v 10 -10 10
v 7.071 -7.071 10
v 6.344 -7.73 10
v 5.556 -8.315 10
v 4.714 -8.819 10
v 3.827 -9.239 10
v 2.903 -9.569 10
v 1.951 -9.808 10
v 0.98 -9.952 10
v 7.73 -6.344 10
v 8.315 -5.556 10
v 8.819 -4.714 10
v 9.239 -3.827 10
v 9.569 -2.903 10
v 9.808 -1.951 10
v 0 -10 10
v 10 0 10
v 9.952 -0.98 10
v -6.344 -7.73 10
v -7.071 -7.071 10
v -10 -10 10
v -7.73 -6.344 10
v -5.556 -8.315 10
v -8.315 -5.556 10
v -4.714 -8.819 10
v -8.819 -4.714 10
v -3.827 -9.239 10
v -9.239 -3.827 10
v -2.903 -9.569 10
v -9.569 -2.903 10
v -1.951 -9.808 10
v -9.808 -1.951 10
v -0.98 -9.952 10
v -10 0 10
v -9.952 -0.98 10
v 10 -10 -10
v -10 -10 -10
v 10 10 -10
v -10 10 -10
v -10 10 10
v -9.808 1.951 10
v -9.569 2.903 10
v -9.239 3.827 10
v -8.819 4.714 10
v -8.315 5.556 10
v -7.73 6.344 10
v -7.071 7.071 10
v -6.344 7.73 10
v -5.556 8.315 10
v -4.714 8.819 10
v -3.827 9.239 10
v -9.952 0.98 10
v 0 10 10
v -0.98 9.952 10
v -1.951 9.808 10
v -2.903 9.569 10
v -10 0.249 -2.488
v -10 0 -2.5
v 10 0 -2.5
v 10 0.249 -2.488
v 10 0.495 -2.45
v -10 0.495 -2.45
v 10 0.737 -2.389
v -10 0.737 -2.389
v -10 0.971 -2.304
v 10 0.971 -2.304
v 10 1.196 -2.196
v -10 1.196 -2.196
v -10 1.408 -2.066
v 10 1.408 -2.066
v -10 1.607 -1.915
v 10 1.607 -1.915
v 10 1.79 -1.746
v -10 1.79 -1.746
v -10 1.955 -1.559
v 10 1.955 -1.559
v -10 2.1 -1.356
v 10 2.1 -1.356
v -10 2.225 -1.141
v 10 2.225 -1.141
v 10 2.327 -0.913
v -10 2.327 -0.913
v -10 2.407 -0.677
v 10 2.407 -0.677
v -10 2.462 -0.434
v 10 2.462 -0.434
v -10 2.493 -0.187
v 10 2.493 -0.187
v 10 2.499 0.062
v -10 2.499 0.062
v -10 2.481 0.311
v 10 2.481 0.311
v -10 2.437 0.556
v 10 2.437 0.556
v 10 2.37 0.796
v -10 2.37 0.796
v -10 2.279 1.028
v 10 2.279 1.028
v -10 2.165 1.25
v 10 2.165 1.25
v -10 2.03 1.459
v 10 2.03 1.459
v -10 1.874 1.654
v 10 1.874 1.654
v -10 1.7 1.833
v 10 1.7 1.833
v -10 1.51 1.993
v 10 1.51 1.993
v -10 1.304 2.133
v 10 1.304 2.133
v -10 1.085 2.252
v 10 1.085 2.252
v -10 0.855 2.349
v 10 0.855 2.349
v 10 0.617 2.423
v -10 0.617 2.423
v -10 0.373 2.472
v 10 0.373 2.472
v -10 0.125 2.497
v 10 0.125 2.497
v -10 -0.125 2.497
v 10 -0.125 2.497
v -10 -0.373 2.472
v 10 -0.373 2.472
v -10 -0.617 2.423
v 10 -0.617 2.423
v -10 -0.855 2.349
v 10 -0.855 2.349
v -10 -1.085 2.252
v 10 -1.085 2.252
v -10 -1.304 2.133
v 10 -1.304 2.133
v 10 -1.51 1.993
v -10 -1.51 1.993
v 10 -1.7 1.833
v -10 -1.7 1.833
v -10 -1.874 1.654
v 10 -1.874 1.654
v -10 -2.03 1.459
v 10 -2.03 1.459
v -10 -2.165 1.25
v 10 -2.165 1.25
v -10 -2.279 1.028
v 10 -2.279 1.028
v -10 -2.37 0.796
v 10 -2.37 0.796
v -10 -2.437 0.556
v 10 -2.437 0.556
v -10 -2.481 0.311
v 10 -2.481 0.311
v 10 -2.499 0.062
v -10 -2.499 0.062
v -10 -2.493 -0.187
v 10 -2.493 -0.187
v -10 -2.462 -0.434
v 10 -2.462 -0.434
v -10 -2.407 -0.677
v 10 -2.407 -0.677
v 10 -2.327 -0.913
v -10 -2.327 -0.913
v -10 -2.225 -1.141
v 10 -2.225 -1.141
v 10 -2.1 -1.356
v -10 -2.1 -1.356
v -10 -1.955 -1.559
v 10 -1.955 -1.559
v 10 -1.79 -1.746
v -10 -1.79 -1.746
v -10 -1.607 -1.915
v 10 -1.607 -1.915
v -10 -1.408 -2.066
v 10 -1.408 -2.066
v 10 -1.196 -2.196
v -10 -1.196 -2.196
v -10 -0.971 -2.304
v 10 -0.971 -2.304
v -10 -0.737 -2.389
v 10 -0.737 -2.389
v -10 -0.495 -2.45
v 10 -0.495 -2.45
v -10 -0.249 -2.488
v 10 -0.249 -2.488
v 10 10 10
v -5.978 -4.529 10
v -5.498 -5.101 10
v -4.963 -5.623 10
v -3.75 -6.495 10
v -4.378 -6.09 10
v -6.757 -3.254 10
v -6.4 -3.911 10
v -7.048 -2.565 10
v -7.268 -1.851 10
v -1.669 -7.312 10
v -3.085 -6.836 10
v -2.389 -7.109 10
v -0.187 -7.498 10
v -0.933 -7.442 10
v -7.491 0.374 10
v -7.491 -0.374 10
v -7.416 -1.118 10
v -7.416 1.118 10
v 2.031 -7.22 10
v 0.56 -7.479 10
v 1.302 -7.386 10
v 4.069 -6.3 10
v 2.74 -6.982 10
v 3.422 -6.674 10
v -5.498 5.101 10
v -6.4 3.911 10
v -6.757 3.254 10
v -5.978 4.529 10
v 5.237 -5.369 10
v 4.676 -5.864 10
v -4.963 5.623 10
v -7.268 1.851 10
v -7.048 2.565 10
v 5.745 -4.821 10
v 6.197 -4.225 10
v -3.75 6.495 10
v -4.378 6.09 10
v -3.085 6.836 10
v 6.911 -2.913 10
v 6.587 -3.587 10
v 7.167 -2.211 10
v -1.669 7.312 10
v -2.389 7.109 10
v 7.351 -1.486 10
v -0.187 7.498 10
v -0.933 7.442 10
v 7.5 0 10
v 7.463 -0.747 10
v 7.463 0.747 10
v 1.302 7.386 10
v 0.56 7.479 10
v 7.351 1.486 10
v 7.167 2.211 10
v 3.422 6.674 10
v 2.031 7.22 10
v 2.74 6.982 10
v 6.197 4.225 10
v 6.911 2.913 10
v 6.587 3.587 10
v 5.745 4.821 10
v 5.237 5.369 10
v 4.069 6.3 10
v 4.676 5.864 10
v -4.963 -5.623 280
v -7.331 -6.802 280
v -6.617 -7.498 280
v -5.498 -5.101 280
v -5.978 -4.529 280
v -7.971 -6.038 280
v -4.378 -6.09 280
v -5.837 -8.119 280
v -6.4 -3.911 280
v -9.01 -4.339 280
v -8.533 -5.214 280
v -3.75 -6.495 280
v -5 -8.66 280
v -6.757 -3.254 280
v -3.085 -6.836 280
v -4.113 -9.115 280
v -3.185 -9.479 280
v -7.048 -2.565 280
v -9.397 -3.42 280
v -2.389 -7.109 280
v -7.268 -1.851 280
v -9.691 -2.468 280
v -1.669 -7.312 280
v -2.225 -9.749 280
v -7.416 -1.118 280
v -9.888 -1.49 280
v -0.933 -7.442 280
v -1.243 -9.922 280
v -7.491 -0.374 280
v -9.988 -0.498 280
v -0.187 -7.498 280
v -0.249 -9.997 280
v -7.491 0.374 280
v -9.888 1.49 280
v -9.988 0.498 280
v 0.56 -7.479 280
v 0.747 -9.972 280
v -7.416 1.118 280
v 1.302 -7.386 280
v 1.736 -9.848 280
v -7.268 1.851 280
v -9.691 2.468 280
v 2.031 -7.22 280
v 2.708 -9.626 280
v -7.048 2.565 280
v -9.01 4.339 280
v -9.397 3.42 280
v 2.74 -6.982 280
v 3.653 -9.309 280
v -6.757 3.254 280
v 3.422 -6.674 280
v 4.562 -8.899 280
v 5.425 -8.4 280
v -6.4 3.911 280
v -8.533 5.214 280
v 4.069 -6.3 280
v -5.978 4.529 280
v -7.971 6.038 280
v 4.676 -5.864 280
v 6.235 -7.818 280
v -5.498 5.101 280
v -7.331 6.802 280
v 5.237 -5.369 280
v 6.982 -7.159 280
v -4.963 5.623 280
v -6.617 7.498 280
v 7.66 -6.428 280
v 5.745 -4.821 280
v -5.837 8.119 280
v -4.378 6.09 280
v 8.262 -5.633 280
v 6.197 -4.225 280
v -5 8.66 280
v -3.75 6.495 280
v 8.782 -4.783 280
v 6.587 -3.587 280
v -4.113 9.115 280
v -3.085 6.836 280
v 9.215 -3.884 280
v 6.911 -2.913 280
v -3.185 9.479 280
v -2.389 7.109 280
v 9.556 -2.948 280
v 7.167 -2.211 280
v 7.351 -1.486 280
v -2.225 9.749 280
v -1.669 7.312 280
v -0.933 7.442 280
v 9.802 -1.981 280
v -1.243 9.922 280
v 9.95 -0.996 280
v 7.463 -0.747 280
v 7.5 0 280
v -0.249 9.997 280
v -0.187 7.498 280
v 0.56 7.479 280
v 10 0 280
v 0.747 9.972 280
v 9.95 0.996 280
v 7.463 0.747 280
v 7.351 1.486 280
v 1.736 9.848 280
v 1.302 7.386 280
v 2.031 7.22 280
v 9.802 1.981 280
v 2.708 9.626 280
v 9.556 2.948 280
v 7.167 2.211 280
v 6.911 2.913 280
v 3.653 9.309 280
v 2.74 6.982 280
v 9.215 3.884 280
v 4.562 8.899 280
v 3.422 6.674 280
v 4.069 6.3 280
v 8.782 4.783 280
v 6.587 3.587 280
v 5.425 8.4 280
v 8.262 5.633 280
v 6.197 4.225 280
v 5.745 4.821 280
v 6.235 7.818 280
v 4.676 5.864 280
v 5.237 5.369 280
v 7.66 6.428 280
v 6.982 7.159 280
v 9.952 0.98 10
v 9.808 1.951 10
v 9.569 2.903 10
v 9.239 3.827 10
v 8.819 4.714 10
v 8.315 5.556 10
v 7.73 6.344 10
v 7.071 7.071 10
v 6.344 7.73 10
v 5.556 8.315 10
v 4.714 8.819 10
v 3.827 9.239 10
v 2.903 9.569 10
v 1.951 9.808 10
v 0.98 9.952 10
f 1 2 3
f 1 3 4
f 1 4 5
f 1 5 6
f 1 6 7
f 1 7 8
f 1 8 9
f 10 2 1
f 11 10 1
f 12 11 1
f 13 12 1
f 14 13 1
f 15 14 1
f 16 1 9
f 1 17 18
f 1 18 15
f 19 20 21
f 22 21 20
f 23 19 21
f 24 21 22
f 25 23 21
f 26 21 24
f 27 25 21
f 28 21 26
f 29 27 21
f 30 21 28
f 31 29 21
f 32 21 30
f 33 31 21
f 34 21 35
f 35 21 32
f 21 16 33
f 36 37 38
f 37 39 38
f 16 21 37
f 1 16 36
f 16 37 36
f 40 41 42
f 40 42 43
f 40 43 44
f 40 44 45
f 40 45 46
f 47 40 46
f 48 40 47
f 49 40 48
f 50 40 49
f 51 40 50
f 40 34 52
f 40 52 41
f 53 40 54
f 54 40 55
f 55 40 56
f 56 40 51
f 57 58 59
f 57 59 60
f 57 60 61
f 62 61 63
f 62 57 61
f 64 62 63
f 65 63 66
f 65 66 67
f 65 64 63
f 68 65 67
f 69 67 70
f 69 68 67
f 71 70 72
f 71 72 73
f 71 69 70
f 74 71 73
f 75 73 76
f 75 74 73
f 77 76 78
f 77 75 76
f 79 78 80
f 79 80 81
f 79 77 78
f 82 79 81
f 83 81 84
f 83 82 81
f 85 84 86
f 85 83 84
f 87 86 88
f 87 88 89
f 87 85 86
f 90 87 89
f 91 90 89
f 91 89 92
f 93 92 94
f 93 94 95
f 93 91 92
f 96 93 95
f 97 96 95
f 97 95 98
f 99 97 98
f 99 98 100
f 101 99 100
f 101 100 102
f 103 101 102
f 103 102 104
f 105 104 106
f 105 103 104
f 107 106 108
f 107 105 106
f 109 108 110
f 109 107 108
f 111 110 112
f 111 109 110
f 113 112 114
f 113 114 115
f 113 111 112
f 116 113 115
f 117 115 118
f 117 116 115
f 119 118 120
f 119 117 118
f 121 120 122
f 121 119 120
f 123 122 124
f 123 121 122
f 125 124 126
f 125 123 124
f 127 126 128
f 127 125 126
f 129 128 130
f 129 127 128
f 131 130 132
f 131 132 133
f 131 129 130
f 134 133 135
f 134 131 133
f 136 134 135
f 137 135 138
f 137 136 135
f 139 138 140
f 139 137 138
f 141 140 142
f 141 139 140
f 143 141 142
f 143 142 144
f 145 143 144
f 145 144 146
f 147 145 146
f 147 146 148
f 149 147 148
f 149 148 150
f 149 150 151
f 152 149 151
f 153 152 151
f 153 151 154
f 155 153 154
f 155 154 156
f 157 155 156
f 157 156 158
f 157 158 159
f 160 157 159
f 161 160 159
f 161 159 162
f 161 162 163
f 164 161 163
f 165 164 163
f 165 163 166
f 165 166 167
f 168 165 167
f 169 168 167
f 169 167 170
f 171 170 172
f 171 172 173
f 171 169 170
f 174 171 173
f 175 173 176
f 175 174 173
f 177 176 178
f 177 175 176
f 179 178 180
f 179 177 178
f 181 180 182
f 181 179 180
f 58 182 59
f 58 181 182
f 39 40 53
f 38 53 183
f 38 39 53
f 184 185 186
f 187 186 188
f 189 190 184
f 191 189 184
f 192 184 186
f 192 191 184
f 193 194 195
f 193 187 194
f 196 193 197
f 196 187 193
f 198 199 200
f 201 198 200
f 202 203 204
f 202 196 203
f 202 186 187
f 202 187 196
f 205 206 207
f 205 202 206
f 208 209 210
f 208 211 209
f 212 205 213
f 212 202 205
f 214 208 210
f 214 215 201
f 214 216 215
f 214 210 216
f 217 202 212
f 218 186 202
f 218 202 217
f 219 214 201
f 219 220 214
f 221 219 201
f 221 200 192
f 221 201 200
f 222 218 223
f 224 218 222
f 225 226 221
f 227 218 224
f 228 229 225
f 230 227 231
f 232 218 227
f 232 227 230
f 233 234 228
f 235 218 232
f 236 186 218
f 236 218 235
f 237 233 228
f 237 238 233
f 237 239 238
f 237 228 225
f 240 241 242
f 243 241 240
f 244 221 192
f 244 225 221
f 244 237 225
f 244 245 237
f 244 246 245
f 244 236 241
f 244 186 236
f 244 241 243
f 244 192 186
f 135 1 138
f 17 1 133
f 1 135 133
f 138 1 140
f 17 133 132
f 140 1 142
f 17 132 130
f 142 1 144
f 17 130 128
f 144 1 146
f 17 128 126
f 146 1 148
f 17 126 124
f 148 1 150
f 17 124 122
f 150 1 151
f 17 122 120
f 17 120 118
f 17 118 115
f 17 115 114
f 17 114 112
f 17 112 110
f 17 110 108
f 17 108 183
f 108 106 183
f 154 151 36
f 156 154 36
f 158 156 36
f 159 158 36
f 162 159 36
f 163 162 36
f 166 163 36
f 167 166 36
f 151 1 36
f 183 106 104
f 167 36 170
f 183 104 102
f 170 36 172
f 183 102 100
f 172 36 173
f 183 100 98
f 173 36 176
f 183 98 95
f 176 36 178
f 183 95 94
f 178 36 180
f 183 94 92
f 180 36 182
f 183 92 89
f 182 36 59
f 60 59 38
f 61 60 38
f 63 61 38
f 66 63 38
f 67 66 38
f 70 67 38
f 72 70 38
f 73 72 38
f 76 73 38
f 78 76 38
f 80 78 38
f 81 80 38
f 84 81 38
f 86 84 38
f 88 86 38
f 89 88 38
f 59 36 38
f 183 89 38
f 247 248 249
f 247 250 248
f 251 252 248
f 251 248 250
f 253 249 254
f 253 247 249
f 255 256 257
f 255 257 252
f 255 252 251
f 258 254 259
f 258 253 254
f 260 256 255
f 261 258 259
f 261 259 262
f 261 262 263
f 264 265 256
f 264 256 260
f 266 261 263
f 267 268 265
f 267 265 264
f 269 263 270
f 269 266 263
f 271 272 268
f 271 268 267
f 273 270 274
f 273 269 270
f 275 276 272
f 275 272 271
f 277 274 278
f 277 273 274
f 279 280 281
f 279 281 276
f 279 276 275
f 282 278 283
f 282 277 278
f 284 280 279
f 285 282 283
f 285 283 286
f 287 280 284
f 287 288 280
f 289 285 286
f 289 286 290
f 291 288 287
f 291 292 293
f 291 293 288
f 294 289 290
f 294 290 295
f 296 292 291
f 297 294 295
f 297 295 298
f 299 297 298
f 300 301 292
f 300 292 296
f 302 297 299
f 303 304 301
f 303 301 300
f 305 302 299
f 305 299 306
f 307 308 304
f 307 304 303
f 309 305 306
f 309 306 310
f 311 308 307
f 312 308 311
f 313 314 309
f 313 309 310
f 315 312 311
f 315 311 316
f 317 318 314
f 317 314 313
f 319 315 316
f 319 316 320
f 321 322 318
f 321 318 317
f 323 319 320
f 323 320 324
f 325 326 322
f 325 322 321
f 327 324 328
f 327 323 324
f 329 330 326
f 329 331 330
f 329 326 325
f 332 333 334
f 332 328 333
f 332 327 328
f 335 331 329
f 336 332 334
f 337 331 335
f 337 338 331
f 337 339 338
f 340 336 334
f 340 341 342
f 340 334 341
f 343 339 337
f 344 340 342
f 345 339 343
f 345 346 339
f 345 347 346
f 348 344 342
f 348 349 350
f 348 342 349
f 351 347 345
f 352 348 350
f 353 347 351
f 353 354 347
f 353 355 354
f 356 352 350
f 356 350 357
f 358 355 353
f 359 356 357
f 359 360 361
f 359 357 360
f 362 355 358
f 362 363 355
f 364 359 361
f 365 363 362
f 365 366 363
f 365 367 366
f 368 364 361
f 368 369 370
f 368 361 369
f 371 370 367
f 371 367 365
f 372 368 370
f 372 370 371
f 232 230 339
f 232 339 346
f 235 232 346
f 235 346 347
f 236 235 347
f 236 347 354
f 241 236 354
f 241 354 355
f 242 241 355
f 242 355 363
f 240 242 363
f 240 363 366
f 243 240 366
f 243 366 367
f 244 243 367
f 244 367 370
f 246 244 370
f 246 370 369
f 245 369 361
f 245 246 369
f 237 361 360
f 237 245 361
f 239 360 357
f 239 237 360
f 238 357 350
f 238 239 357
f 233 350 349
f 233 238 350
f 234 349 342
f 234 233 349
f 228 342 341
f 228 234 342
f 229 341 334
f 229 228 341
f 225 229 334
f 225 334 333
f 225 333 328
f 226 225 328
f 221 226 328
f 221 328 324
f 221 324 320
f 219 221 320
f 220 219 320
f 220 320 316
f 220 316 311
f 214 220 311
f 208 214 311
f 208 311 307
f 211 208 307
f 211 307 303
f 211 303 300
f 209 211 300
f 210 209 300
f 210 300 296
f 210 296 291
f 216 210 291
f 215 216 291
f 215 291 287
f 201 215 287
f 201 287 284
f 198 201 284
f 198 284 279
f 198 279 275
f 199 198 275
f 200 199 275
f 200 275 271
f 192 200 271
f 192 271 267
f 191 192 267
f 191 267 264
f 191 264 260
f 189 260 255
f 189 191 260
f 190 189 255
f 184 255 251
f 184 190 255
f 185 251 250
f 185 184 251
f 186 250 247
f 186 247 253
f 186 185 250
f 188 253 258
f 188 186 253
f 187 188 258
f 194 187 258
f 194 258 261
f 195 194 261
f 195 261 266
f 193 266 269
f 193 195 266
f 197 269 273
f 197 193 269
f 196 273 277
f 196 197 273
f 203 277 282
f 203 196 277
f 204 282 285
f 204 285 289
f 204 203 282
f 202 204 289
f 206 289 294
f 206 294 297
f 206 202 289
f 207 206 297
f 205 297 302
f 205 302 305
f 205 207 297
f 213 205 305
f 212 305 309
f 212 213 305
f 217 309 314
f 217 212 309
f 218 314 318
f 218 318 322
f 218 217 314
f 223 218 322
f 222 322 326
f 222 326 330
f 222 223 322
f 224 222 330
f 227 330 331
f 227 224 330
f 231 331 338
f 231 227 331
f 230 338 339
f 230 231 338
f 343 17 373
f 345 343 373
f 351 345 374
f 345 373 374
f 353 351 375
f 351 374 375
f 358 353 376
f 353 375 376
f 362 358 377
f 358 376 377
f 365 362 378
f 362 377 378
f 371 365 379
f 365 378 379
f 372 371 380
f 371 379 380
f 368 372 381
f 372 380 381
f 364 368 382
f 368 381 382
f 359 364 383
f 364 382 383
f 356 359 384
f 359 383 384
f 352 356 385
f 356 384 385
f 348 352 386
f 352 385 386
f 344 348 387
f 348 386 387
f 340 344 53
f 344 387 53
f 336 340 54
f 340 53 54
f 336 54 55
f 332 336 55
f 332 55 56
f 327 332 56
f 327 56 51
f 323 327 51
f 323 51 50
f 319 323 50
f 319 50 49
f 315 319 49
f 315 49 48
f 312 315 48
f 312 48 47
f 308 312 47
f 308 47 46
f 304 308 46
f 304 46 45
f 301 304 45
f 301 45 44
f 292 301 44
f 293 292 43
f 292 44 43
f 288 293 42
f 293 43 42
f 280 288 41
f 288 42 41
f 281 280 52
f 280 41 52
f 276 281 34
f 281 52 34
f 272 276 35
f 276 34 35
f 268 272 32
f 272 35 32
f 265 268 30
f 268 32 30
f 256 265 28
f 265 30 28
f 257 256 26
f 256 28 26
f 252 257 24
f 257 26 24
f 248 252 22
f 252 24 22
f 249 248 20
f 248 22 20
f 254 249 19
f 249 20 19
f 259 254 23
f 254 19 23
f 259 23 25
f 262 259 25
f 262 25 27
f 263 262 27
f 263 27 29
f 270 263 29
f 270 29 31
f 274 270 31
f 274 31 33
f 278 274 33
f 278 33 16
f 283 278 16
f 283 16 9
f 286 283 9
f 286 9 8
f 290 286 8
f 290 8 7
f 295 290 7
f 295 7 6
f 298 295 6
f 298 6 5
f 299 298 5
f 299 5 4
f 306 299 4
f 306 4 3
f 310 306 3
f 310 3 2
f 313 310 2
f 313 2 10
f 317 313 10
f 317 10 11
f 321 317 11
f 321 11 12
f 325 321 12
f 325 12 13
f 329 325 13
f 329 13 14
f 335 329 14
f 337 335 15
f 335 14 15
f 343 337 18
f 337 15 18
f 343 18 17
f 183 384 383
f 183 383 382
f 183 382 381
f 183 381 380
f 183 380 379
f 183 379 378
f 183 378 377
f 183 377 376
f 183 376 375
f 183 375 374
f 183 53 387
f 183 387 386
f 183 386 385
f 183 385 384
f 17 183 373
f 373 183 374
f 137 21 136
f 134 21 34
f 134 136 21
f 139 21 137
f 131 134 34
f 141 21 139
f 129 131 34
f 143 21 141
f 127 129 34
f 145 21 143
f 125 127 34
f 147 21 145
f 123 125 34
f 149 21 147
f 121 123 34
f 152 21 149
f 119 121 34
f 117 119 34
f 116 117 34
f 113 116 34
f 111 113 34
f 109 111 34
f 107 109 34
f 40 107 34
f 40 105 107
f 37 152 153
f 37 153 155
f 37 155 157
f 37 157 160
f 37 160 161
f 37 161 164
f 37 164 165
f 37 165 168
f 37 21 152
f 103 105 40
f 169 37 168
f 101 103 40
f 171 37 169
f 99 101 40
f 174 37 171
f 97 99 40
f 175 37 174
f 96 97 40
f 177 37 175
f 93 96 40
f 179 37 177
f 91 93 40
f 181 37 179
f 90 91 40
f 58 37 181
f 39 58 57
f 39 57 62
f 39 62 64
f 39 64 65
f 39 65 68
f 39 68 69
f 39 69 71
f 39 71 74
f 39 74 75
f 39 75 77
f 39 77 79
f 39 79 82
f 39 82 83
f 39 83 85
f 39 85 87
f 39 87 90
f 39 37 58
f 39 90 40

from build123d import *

# Parameters (mm, degrees)
RESSALTO_EXTRUS_O1_DEPTH      = 280
RESSALTO_EXTRUS_O1_DEPTH_BACK = 10
ESBO_O1_R                     = 10
ESBO_O2_R                     = 7.5
CORTE_EXTRUS_O1_DEPTH         = 280
RESSALTO_EXTRUS_O2_DEPTH      = 10
RESSALTO_EXTRUS_O2_DEPTH_BACK = 10
ESBO_O4_W                     = 20
ESBO_O4_H                     = 20
CORTE_EXTRUS_O2_DEPTH         = 10
CORTE_EXTRUS_O2_DEPTH_BACK    = 10
ESBO_O3_R                     = 2.5


with BuildPart() as part:
    # Esboço1 → Ressalto-extrusão1 (new, two sides: drawn at the far end of the back side and taken through both)
    with BuildSketch(Plane.XY.offset(-RESSALTO_EXTRUS_O1_DEPTH_BACK)):
        Circle(ESBO_O1_R)
    extrude(amount=RESSALTO_EXTRUS_O1_DEPTH + RESSALTO_EXTRUS_O1_DEPTH_BACK)

    # Esboço2 → Corte-extrusão1 (cut)
    with BuildSketch(Plane.XY):
        Circle(ESBO_O2_R)
    extrude(amount=CORTE_EXTRUS_O1_DEPTH, mode=Mode.SUBTRACT)

    # Esboço4 → Ressalto-extrusão2 (add, two sides: drawn at the far end of the back side and taken through both)
    with BuildSketch(Plane.XY.offset(-RESSALTO_EXTRUS_O2_DEPTH_BACK)):
        Rectangle(ESBO_O4_W, ESBO_O4_H)
    extrude(amount=RESSALTO_EXTRUS_O2_DEPTH + RESSALTO_EXTRUS_O2_DEPTH_BACK)

    # Esboço3 → Corte-extrusão2 (cut, two sides: drawn at the far end of the back side and taken through both)
    with BuildSketch(Plane(origin=(0, 0, 0), x_dir=(0, 0, -1), z_dir=(1, 0, 0)).offset(-CORTE_EXTRUS_O2_DEPTH_BACK)):
        Circle(ESBO_O3_R)
    extrude(amount=CORTE_EXTRUS_O2_DEPTH + CORTE_EXTRUS_O2_DEPTH_BACK, mode=Mode.SUBTRACT)


solid = part.part
